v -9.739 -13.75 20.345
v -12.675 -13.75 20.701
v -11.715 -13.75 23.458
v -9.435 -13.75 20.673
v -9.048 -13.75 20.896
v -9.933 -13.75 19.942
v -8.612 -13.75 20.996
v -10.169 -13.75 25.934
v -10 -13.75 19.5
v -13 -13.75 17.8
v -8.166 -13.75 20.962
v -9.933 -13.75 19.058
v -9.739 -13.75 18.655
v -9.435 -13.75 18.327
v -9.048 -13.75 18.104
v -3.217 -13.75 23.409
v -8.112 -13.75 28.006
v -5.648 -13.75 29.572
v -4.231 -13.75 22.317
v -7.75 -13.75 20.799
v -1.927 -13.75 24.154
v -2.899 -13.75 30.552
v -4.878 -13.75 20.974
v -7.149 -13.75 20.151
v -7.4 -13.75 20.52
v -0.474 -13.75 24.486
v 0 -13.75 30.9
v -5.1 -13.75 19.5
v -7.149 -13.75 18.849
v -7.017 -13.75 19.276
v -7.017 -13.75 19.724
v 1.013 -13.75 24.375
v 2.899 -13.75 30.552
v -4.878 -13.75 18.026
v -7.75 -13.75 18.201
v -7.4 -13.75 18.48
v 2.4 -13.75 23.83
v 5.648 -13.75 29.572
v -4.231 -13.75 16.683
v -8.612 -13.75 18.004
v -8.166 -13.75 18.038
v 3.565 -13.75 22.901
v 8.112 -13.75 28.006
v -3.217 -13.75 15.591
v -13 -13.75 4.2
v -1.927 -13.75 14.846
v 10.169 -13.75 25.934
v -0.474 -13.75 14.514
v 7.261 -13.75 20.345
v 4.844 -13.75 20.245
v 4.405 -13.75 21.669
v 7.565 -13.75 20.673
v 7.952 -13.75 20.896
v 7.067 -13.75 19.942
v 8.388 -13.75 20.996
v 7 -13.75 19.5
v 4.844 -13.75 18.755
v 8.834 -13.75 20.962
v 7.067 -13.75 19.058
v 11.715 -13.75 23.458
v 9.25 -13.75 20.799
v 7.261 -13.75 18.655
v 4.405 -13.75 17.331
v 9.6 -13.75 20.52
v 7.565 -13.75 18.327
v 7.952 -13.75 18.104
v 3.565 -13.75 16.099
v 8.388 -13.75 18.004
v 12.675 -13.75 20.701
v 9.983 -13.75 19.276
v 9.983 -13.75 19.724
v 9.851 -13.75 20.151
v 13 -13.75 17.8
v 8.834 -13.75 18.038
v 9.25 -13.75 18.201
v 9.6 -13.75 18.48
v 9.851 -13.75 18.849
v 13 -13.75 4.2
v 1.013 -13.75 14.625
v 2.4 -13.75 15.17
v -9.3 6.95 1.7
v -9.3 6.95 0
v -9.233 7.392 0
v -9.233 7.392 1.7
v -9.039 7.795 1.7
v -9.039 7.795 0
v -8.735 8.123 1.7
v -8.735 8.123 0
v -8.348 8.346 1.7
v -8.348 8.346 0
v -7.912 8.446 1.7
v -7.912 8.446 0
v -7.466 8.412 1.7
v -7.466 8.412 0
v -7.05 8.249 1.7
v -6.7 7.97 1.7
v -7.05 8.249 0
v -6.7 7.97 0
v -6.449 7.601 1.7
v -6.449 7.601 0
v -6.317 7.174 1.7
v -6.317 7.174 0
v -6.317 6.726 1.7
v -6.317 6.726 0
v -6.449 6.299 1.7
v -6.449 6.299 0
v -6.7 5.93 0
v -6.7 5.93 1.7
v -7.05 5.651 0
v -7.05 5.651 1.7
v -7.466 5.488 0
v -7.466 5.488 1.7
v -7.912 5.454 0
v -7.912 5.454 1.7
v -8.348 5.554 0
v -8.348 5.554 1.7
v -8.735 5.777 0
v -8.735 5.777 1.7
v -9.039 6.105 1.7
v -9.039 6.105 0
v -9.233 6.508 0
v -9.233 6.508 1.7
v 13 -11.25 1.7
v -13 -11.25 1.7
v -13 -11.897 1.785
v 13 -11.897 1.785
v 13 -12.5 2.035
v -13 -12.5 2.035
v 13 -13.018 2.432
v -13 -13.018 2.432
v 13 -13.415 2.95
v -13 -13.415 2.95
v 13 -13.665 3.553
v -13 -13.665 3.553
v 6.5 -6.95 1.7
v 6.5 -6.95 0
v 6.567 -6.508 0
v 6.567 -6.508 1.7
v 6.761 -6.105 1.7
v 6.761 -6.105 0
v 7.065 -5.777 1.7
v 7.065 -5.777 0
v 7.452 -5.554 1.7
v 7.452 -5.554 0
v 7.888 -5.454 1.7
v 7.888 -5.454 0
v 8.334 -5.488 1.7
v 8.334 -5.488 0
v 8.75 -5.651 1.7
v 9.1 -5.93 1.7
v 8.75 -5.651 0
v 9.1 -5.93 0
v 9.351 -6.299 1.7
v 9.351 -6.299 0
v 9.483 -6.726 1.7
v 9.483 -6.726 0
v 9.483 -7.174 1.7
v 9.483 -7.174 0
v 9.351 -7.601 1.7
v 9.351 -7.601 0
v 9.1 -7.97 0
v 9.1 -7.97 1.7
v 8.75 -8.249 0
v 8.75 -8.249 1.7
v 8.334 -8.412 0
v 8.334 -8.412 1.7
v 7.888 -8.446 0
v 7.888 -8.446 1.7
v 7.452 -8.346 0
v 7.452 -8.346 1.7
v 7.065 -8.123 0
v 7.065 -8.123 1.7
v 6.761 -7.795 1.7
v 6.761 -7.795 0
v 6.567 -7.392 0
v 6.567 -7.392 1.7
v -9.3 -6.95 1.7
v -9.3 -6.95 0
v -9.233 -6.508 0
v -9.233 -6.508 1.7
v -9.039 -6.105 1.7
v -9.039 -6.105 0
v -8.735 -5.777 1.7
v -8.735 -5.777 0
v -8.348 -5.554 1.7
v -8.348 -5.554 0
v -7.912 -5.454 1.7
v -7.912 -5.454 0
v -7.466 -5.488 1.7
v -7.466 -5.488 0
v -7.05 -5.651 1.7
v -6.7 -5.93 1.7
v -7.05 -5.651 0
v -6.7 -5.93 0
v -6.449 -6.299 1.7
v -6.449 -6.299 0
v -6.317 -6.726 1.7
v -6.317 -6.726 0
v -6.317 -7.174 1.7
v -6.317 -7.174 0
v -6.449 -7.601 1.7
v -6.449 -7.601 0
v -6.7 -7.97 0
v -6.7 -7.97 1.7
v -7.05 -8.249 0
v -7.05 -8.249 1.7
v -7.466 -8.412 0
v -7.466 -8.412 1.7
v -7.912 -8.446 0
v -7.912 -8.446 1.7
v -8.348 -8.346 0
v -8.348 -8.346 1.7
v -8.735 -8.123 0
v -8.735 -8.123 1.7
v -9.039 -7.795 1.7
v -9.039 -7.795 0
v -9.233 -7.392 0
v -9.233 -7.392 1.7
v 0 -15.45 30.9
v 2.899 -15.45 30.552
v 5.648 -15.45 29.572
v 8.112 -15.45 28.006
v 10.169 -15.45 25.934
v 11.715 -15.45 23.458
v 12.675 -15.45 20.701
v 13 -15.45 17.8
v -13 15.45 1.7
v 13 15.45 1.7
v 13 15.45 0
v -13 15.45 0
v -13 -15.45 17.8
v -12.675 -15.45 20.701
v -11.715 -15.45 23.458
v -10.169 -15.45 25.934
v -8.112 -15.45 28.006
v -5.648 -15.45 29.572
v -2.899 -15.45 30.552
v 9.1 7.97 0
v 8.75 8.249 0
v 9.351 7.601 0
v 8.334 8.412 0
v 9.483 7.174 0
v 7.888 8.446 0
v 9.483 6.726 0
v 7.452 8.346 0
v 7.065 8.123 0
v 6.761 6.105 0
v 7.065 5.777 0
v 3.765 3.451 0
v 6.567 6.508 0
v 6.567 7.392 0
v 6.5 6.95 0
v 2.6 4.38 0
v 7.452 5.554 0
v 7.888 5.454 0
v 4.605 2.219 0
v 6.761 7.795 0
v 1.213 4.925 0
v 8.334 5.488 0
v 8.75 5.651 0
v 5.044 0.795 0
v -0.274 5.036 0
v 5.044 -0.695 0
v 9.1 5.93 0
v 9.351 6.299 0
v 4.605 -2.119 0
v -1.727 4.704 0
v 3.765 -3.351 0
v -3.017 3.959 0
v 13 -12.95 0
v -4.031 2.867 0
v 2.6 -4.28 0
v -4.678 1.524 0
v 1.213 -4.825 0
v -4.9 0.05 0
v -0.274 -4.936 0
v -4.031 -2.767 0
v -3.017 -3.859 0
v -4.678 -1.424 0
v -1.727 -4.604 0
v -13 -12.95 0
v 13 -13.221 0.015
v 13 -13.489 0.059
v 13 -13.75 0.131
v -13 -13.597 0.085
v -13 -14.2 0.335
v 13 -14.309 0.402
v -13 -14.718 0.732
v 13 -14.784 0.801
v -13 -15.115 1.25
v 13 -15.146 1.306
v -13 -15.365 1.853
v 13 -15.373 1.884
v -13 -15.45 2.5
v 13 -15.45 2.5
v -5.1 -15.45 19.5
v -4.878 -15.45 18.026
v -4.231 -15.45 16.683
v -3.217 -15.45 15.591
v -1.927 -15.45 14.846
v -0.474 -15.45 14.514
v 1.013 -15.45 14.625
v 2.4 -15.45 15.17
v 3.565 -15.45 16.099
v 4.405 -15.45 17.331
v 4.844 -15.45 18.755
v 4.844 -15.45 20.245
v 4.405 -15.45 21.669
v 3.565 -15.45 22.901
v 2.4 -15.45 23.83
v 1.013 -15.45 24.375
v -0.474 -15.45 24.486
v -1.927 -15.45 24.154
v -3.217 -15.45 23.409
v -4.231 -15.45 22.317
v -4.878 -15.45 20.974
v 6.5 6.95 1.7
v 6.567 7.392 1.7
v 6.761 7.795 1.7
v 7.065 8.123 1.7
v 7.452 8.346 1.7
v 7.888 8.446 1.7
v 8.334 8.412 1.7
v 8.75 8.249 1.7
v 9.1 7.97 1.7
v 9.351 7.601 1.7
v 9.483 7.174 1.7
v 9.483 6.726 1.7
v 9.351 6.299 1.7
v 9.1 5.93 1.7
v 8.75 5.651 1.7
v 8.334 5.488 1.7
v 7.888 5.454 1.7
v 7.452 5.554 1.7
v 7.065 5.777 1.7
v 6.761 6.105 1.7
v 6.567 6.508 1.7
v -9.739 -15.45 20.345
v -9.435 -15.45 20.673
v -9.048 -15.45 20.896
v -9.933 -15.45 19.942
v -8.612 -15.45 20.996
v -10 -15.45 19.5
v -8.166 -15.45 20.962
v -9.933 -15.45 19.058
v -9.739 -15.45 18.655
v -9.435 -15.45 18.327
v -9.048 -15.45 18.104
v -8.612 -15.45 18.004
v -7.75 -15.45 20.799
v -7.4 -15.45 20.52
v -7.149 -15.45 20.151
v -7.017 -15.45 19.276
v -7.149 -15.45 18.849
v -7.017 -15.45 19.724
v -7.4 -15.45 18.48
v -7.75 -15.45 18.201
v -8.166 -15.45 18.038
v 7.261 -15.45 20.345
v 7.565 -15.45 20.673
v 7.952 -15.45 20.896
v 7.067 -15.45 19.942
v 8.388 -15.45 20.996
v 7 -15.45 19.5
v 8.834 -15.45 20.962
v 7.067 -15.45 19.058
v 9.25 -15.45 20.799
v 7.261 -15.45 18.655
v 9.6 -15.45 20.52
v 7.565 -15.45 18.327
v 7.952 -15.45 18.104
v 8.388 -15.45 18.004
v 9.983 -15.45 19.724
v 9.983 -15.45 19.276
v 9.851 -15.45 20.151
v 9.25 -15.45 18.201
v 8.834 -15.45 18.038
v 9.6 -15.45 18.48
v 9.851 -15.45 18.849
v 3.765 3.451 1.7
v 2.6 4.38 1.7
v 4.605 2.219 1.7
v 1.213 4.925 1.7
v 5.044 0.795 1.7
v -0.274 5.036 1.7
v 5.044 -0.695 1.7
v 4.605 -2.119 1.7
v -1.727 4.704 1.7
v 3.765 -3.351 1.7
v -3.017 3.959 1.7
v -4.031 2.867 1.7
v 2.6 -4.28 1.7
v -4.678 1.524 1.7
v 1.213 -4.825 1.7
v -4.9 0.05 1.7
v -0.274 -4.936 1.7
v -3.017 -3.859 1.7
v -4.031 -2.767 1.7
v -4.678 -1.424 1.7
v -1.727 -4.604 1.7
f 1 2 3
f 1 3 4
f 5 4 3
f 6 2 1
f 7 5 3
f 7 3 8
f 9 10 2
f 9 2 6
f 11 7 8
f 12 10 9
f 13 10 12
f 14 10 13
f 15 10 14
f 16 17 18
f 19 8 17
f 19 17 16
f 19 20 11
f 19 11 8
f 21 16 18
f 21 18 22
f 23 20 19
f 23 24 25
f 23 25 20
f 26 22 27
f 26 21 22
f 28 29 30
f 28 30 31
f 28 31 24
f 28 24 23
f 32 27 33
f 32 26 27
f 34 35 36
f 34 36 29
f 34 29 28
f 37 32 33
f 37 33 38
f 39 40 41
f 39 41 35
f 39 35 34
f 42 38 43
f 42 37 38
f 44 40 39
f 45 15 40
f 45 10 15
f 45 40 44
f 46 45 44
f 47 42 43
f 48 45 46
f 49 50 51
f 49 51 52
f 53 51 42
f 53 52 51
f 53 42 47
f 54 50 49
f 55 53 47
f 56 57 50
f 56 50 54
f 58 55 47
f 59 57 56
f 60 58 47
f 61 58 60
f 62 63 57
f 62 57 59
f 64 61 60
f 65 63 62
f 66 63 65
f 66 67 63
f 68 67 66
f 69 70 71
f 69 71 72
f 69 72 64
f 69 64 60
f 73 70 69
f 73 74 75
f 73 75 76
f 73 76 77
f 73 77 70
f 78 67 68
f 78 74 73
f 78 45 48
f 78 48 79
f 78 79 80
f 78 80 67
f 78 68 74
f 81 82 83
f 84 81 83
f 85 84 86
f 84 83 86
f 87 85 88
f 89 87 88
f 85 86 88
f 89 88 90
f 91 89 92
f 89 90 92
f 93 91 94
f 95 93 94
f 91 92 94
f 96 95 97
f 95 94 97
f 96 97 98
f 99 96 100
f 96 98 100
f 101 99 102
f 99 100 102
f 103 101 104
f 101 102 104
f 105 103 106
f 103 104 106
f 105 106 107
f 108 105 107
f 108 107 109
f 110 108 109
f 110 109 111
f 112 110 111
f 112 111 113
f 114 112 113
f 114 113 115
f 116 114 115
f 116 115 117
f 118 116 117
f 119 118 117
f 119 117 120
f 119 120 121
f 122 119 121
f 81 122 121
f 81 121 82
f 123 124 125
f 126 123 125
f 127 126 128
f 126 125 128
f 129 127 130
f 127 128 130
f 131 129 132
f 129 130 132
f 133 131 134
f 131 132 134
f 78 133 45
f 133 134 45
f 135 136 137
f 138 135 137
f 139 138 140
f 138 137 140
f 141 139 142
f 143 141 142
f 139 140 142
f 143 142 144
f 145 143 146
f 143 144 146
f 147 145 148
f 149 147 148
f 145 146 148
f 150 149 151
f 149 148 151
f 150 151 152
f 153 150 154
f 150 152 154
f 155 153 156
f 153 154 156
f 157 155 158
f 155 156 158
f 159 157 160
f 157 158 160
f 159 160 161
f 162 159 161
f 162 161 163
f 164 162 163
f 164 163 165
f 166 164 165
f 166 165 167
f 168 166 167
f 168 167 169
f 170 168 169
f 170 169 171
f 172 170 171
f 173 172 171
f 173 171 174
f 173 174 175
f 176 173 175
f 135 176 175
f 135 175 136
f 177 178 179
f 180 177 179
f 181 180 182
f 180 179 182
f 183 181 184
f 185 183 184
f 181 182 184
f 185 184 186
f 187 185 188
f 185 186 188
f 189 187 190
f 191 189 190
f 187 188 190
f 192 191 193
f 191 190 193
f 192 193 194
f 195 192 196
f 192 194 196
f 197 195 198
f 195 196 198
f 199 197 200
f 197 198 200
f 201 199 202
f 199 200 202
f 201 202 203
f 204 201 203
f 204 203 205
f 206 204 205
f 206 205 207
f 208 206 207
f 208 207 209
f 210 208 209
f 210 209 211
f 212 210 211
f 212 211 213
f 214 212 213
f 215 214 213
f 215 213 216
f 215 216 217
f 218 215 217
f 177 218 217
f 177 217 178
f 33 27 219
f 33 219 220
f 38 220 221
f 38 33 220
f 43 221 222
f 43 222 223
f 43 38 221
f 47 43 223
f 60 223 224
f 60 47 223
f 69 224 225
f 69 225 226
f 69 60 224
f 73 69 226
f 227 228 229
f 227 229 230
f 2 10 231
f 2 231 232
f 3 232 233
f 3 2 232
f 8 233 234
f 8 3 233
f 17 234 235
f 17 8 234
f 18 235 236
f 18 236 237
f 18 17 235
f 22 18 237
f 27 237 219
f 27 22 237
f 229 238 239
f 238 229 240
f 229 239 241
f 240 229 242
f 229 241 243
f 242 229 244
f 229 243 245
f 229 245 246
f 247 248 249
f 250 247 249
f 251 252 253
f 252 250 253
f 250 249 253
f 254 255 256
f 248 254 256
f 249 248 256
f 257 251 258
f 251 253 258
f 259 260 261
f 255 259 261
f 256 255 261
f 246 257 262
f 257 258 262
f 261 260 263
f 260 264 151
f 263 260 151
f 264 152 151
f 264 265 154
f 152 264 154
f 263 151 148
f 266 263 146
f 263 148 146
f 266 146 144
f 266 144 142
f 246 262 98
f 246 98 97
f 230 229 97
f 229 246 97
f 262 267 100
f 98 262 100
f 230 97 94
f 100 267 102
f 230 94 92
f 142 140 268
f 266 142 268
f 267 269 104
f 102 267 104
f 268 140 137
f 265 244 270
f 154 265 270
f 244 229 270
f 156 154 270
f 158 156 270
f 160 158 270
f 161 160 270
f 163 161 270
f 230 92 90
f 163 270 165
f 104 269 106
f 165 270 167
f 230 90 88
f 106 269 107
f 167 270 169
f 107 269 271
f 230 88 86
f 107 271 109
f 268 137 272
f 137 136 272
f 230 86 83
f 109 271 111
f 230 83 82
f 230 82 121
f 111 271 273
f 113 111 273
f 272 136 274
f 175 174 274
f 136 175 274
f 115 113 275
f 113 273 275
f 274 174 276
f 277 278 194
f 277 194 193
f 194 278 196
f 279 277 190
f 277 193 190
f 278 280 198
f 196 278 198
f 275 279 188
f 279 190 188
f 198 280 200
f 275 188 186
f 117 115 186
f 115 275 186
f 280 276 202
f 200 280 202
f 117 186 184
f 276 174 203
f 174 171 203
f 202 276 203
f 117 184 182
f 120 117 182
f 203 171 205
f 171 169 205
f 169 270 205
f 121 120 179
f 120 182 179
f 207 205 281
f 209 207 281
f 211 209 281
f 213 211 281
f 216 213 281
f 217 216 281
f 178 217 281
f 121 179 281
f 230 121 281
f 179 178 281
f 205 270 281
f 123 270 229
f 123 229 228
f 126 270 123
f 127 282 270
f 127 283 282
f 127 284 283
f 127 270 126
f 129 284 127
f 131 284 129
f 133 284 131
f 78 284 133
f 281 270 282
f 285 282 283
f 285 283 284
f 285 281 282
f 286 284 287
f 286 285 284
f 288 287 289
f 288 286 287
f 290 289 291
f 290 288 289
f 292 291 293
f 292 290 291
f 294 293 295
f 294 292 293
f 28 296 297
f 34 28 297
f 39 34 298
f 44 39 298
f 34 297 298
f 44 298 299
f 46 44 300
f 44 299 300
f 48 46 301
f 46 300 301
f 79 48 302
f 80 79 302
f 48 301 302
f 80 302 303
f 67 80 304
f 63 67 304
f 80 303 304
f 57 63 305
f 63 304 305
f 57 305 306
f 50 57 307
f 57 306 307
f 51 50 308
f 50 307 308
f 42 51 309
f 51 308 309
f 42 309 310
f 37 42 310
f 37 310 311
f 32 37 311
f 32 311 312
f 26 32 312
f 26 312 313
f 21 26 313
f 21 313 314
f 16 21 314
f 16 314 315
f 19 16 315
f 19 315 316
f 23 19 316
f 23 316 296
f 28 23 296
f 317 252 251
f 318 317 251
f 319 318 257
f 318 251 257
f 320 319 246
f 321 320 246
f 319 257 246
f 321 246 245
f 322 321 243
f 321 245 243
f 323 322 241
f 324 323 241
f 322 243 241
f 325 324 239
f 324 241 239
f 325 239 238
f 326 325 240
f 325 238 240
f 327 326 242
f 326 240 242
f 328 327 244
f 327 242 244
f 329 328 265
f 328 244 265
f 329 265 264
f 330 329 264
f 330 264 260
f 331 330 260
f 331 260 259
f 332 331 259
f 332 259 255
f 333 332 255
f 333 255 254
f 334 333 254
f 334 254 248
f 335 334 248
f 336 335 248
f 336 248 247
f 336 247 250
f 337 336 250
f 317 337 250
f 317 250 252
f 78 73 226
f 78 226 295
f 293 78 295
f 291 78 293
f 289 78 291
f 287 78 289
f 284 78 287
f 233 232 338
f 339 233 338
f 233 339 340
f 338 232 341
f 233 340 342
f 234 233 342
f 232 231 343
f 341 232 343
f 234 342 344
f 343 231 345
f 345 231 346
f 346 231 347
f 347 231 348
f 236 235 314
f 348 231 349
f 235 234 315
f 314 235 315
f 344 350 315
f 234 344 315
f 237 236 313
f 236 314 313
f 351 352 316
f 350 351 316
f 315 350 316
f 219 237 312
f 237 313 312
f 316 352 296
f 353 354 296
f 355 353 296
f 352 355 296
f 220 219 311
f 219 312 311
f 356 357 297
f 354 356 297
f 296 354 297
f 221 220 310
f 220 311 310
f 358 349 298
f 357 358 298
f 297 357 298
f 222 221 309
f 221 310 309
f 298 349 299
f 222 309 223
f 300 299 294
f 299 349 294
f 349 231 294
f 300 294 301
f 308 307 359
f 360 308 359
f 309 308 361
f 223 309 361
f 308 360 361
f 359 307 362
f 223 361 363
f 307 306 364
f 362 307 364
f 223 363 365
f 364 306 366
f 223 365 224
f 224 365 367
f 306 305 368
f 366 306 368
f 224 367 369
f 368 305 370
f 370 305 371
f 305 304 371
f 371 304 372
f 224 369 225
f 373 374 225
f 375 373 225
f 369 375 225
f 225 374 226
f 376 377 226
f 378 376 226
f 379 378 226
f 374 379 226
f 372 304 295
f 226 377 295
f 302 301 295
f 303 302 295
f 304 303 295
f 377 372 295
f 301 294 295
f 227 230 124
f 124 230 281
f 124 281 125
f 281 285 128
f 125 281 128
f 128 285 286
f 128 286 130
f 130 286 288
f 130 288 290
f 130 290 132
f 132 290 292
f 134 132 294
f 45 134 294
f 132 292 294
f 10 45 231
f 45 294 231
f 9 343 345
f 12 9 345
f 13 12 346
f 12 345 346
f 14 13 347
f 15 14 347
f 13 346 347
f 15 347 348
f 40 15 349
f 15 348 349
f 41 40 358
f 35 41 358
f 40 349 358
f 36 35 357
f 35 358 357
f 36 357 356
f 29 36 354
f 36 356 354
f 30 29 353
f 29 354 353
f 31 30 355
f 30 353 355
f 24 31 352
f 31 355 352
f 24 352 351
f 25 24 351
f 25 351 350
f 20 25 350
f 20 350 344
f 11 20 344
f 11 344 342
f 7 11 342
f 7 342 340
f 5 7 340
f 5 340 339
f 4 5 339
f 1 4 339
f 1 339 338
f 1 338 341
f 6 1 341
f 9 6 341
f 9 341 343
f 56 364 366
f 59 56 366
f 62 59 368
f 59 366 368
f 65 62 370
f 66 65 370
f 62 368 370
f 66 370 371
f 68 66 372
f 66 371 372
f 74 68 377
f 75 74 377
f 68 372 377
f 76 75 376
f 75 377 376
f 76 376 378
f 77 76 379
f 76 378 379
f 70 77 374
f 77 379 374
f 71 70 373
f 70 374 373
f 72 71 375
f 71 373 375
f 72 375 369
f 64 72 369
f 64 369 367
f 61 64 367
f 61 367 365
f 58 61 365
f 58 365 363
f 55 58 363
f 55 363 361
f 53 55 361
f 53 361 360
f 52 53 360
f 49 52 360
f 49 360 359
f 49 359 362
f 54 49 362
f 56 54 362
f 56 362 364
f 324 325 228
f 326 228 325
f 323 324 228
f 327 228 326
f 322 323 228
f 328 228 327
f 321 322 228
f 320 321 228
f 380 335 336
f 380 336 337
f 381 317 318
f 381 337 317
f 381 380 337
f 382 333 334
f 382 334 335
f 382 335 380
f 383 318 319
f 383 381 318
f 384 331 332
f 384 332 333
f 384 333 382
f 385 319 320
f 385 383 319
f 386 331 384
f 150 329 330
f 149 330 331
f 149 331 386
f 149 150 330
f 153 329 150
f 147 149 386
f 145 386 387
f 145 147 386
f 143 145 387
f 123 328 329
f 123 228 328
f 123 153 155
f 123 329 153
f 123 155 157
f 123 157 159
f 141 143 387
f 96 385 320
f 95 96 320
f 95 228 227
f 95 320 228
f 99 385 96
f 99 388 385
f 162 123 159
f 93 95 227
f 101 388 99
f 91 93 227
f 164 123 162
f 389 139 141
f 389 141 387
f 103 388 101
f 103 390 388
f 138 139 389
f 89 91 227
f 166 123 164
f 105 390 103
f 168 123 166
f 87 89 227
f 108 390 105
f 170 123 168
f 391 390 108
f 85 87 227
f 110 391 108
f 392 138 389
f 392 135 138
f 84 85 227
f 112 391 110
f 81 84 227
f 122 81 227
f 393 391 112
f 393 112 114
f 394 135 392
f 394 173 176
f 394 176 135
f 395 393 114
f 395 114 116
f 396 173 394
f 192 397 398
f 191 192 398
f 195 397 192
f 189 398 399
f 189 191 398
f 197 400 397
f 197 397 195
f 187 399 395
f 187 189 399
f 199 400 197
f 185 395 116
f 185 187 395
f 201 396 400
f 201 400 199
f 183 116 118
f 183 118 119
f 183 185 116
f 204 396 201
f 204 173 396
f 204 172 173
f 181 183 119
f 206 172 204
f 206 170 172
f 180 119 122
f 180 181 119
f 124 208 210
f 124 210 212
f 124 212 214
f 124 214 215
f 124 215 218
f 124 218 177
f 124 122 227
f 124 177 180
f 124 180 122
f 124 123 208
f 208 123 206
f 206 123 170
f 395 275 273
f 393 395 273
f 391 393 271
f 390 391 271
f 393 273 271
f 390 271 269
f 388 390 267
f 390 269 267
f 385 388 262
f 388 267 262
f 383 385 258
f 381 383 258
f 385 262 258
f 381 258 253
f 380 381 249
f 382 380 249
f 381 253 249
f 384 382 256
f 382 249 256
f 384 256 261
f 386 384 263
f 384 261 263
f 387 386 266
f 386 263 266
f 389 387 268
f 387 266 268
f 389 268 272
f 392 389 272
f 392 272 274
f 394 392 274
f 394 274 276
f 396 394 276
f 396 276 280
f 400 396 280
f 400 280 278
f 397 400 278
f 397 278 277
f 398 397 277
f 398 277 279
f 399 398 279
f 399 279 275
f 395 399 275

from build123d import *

# Parameters (mm, degrees)
BOSS_EXTRUDE1_DEPTH        = 1.7
SKETCH2_W                  = 26
SKETCH2_H                  = 1.7
BOSS_EXTRUDE2_DEPTH        = 29.2
F_10_0_10_DIAMETER_HOLE1_D = 10
F_3_0_3_DIAMETER_HOLE1_D   = 3
F_10_0_10_DIAMETER_HOLE2_D = 10
F_3_0_3_DIAMETER_HOLE2_D   = 3
FILLET1_R                  = 2.5


with BuildPart() as part:
    # Sketch1 → Boss-Extrude1 (new body)
    with BuildSketch(Plane(origin=(0, -13.75, 0), x_dir=(1, 0, 0), z_dir=(0, 1, 0))):
        with BuildLine():
            Line((13.000000223, -17.8), (13.000000223, 0))
            Line((13.000000223, 0), (-13, 0))
            Line((-13, 0), (-13, -17.8))
            ThreePointArc((-13, -17.8), (-9.198386918, -27.027675803), (1.11e-07, -30.899618316))
            ThreePointArc((1.11e-07, -30.899618316), (9.19838714, -27.027675803), (13.000000223, -17.8))
        make_face()
    extrude(amount=-BOSS_EXTRUDE1_DEPTH)

    # Sketch2 → Boss-Extrude2 (add)
    with BuildSketch(Plane(origin=(0, -13.75, 0), x_dir=(-1, 0, 0), z_dir=(0, 1, 0))):
        with Locations((0, 0.85)):
            Rectangle(SKETCH2_W, SKETCH2_H)
    extrude(amount=BOSS_EXTRUDE2_DEPTH)

    # Ø10.0 (10) Diameter Hole1 (through all)
    with Locations(Plane(origin=(0, -13.75, 0), x_dir=(1, 0, 0), z_dir=(0, 1, 0))):
        with Locations((-0.099999806, -19.5)):
            Hole(F_10_0_10_DIAMETER_HOLE1_D / 2)

    # Ø3.0 (3) Diameter Hole1 (through all)
    with Locations(Plane(origin=(0, -13.75, 0), x_dir=(1, 0, 0), z_dir=(0, 1, 0))):
        with Locations((8.5, -19.5), (-8.5, -19.5)):
            Hole(F_3_0_3_DIAMETER_HOLE1_D / 2)

    # Ø10.0 (10) Diameter Hole2 (through all)
    with Locations(Plane.XY.offset(1.7)):
        with Locations((0.1, 0.05)):
            Hole(F_10_0_10_DIAMETER_HOLE2_D / 2)

    # Ø3.0 (3) Diameter Hole2 (through all)
    with Locations(Plane.XY.offset(1.7)):
        with Locations((-7.8, 6.95), (8, -6.95), (-7.8, -6.95), (8, 6.95)):
            Hole(F_3_0_3_DIAMETER_HOLE2_D / 2)

    # Fillet1
    fillet1_edges = [part.edges().sort_by_distance(p)[0] for p in [
        (1.11e-07, -15.45, 0),
        (0, -13.75, 1.7),
    ]]
    fillet(fillet1_edges, radius=FILLET1_R)


solid = part.part
